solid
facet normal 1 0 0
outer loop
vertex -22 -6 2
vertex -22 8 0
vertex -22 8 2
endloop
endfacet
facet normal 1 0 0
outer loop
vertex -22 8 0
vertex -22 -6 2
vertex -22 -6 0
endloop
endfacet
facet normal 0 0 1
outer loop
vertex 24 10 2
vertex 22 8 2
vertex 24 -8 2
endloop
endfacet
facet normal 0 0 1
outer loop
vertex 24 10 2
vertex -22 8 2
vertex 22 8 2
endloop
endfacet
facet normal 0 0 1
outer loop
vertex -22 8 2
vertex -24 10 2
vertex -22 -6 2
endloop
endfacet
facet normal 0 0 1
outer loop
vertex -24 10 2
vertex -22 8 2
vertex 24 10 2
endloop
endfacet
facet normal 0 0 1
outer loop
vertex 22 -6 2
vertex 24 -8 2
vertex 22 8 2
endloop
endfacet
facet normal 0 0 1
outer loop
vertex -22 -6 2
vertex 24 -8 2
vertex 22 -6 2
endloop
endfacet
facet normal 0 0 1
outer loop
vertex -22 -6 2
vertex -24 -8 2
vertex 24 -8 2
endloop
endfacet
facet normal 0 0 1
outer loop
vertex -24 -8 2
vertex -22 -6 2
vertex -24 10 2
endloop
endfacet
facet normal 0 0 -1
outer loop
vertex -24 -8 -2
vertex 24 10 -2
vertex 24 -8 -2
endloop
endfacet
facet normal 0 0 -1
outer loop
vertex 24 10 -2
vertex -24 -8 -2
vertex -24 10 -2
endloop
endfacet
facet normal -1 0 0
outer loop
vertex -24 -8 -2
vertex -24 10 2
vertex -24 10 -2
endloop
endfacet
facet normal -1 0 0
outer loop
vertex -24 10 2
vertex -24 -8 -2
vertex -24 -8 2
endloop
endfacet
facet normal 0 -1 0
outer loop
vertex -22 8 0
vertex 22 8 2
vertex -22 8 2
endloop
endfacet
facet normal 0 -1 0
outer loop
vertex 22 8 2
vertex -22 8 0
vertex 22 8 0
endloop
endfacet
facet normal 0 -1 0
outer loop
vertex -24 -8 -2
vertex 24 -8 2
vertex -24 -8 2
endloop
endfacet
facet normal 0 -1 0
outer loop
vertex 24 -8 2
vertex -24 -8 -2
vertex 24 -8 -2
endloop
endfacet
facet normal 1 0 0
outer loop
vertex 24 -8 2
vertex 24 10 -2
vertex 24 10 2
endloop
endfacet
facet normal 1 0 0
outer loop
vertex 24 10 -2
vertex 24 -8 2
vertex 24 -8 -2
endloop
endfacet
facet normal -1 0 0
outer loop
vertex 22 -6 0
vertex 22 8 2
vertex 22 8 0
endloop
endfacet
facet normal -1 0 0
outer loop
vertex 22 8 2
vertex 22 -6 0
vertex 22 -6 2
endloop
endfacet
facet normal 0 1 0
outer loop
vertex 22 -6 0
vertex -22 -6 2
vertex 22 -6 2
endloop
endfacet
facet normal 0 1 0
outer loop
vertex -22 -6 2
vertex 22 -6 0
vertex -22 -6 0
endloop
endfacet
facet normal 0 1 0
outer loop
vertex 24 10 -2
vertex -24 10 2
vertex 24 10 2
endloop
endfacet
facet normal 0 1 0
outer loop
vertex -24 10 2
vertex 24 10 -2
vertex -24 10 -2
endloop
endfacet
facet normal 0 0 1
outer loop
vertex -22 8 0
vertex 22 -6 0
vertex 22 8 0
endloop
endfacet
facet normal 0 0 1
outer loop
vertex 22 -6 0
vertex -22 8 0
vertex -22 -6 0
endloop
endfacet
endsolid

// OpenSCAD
module jmenovka( text="Jméno", frame=true ) {
    x   = 48;
    y   = 16;
    z   =  2;

    velikost = [x,y,z];

    translate( -velikost/2 - [0,0,z/2]) {
        cube( velikost );

        if ( frame ) {
            for ( i = [0,1] )
                translate( i*[x-2,0,0] )
                    cube( [z,y,2*z] );

            for ( i = [0,1] )
                translate( i*[0,y,0] )
                    cube( [x,z,2*z] );
        }
    }

    translate([0,0,0.5])
        color("black")
            text( text=text, size=8, halign="center", valign="center", spacing=1 );
}

jmenovka("Myslivec");
